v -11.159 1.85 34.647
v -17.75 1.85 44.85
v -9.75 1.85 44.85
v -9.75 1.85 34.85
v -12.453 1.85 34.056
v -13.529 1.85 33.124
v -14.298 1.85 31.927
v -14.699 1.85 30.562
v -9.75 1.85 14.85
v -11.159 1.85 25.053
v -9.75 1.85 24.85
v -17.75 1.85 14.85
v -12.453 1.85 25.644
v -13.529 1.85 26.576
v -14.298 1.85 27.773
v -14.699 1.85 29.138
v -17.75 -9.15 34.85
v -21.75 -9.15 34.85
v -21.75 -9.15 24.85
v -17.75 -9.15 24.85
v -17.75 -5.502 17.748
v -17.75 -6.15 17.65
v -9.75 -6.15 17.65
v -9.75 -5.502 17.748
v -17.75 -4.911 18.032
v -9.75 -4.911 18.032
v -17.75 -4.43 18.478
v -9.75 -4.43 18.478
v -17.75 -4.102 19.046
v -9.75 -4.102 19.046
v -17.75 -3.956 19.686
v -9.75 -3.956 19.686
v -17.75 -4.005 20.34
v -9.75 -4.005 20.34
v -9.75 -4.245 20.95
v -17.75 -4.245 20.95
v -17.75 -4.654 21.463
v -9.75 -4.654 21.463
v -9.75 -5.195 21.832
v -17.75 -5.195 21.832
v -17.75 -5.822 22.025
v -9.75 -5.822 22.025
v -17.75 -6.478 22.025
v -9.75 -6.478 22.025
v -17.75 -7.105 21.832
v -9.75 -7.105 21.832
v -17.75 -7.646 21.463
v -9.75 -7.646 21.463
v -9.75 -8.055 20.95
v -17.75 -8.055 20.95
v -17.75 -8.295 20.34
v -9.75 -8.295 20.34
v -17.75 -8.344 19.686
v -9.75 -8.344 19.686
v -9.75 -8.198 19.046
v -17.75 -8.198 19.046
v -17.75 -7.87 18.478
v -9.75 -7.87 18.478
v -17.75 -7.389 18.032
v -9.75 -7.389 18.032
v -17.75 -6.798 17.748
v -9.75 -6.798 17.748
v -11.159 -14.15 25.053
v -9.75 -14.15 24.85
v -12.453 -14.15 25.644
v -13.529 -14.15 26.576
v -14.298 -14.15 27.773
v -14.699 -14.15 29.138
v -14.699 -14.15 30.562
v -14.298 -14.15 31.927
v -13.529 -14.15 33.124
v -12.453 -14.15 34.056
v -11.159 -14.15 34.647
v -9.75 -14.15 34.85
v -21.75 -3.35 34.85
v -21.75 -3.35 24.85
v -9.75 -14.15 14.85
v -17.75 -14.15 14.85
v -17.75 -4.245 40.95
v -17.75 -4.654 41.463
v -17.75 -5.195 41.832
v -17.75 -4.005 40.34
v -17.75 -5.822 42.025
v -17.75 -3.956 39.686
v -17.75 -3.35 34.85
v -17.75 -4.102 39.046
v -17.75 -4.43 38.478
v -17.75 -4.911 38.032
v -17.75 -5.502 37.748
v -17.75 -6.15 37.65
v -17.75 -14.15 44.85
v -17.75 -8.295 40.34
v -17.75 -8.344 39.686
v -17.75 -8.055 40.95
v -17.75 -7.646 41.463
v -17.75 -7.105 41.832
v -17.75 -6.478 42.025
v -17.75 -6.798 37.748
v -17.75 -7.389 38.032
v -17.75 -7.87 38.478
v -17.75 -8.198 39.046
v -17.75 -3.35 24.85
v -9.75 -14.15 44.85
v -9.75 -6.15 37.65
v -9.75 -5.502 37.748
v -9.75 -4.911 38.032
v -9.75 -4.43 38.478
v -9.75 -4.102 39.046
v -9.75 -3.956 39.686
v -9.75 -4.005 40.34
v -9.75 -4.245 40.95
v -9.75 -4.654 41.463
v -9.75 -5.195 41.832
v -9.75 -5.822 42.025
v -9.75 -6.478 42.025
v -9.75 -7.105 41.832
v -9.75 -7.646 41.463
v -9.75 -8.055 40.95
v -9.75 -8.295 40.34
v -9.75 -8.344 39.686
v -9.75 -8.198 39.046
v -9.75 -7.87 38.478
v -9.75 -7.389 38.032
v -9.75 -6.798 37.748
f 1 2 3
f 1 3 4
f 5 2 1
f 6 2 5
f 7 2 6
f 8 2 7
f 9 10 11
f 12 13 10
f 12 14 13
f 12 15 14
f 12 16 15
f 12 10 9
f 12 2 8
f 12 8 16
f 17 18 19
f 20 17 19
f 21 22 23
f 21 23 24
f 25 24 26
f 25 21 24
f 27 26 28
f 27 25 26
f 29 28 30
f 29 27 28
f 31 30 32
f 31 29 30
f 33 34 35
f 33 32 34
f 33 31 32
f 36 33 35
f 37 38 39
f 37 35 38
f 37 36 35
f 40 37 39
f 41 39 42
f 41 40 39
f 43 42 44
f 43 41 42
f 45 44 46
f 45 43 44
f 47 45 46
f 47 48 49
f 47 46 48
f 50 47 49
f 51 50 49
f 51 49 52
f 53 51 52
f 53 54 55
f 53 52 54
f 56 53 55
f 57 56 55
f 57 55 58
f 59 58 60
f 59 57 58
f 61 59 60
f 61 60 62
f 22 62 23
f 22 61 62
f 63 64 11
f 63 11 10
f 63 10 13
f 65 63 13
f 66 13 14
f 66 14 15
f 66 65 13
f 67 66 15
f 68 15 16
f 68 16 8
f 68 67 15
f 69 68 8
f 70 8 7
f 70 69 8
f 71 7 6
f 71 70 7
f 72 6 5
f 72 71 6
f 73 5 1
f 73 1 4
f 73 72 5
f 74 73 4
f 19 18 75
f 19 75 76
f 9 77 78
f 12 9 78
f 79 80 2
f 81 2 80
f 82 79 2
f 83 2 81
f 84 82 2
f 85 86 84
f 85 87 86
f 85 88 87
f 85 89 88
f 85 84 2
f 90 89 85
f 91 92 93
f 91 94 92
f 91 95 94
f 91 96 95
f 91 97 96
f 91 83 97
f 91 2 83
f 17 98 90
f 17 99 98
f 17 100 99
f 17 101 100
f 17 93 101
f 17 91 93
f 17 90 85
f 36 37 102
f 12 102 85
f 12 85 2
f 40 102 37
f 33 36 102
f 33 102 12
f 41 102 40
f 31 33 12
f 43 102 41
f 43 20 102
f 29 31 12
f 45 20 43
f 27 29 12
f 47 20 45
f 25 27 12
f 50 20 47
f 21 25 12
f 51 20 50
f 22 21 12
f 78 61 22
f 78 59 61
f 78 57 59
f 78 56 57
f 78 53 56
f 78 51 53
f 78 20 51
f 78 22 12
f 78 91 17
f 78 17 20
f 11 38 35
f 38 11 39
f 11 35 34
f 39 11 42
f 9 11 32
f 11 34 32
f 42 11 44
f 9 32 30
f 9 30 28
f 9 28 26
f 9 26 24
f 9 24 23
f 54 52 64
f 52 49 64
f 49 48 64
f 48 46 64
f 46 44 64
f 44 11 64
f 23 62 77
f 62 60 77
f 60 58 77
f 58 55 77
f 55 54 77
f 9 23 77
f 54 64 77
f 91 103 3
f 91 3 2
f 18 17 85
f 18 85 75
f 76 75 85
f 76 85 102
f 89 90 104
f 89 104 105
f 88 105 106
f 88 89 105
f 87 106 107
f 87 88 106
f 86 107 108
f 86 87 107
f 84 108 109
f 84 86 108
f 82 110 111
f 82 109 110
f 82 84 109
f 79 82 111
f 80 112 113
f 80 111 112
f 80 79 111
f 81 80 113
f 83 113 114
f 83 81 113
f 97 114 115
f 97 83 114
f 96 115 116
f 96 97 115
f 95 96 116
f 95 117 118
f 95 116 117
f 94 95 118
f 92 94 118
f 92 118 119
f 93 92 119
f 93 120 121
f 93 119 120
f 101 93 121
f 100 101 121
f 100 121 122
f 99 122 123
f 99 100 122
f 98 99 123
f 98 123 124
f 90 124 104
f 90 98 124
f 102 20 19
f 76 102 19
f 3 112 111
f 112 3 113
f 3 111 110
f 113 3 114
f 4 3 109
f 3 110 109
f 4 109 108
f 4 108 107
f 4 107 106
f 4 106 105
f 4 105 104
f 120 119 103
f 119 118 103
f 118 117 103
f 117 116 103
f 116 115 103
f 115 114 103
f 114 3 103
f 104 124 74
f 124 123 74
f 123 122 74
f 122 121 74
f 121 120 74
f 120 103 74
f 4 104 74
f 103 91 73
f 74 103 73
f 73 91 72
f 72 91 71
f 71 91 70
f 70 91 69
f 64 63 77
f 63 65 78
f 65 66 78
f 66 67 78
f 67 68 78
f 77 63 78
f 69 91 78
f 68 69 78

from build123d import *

# Parameters (mm, degrees)
BOX053_W                  = 10
BOX053_H                  = 4
BOX053_DEPTH              = 5.8
CYLINDER066_R             = 2.2
CYLINDER066_DEPTH         = 20
CYLINDER067_R             = 2.2
CYLINDER067_DEPTH         = 20
CYLINDER064_R             = 5
CYLINDER064_DEPTH         = 16
BOX051_W                  = 30
BOX051_H                  = 8
BOX051_DEPTH              = 16
FUSION036_PITCH_ANGLE     = 90
FUSION036_PLACEMENT_ANGLE = 90


with BuildPart() as quader032:
    # Box053 → Box053 (new body)
    with BuildSketch(Plane(origin=(-5, 8, 5), x_dir=(1, 0, 0), z_dir=(0, 0, 1))):
        with Locations((5, 2)):
            Rectangle(BOX053_W, BOX053_H)
    extrude(amount=BOX053_DEPTH)


with BuildPart() as zylinder055:
    # Cylinder066 → Cylinder066 (new body)
    with BuildSketch(Plane(origin=(-10, 9, 8), x_dir=(1, 0, 0), z_dir=(0, -1, 0))):
        Circle(CYLINDER066_R)
    extrude(amount=CYLINDER066_DEPTH)


with BuildPart() as zylinder056:
    # Cylinder067 → Cylinder067 (new body)
    with BuildSketch(Plane(origin=(10, 9, 8), x_dir=(1, 0, 0), z_dir=(0, -1, 0))):
        Circle(CYLINDER067_R)
    extrude(amount=CYLINDER067_DEPTH)


with BuildPart() as zylinder053:
    # Cylinder064 → Cylinder064 (new body)
    with BuildSketch(Plane.XY):
        Circle(CYLINDER064_R)
    extrude(amount=CYLINDER064_DEPTH)


with BuildPart() as y_mount_bottom:
    # Box051 → Box051 (new body)
    with BuildSketch(Plane(origin=(-15, 0, 0), x_dir=(1, 0, 0), z_dir=(0, 0, 1))):
        with Locations((15, 4)):
            Rectangle(BOX051_W, BOX051_H)
    extrude(amount=BOX051_DEPTH)

    # Cut071: cut Zylinder053
    add(zylinder053.part, mode=Mode.SUBTRACT)

    # Cut073: cut Zylinder056
    add(zylinder056.part, mode=Mode.SUBTRACT)

    # Cut074: cut Zylinder055
    add(zylinder055.part, mode=Mode.SUBTRACT)

    # Fusion036: union Quader032
    add(quader032.part)


with BuildPart() as y_mount_bottom_1:
    # Fusion036 pitch: moved
    add(y_mount_bottom.part.rotate(Axis((0, 0, 0), (0, 1, 0)), FUSION036_PITCH_ANGLE))


with BuildPart() as y_mount_bottom_2:
    # Fusion036 placement: moved
    add(y_mount_bottom_1.part.moved(Location((-9.75, -14.15, 29.85))).rotate(Axis((-9.75, -14.15, 29.85), (0, 0, 1)), FUSION036_PLACEMENT_ANGLE))


solid = y_mount_bottom_2.part
